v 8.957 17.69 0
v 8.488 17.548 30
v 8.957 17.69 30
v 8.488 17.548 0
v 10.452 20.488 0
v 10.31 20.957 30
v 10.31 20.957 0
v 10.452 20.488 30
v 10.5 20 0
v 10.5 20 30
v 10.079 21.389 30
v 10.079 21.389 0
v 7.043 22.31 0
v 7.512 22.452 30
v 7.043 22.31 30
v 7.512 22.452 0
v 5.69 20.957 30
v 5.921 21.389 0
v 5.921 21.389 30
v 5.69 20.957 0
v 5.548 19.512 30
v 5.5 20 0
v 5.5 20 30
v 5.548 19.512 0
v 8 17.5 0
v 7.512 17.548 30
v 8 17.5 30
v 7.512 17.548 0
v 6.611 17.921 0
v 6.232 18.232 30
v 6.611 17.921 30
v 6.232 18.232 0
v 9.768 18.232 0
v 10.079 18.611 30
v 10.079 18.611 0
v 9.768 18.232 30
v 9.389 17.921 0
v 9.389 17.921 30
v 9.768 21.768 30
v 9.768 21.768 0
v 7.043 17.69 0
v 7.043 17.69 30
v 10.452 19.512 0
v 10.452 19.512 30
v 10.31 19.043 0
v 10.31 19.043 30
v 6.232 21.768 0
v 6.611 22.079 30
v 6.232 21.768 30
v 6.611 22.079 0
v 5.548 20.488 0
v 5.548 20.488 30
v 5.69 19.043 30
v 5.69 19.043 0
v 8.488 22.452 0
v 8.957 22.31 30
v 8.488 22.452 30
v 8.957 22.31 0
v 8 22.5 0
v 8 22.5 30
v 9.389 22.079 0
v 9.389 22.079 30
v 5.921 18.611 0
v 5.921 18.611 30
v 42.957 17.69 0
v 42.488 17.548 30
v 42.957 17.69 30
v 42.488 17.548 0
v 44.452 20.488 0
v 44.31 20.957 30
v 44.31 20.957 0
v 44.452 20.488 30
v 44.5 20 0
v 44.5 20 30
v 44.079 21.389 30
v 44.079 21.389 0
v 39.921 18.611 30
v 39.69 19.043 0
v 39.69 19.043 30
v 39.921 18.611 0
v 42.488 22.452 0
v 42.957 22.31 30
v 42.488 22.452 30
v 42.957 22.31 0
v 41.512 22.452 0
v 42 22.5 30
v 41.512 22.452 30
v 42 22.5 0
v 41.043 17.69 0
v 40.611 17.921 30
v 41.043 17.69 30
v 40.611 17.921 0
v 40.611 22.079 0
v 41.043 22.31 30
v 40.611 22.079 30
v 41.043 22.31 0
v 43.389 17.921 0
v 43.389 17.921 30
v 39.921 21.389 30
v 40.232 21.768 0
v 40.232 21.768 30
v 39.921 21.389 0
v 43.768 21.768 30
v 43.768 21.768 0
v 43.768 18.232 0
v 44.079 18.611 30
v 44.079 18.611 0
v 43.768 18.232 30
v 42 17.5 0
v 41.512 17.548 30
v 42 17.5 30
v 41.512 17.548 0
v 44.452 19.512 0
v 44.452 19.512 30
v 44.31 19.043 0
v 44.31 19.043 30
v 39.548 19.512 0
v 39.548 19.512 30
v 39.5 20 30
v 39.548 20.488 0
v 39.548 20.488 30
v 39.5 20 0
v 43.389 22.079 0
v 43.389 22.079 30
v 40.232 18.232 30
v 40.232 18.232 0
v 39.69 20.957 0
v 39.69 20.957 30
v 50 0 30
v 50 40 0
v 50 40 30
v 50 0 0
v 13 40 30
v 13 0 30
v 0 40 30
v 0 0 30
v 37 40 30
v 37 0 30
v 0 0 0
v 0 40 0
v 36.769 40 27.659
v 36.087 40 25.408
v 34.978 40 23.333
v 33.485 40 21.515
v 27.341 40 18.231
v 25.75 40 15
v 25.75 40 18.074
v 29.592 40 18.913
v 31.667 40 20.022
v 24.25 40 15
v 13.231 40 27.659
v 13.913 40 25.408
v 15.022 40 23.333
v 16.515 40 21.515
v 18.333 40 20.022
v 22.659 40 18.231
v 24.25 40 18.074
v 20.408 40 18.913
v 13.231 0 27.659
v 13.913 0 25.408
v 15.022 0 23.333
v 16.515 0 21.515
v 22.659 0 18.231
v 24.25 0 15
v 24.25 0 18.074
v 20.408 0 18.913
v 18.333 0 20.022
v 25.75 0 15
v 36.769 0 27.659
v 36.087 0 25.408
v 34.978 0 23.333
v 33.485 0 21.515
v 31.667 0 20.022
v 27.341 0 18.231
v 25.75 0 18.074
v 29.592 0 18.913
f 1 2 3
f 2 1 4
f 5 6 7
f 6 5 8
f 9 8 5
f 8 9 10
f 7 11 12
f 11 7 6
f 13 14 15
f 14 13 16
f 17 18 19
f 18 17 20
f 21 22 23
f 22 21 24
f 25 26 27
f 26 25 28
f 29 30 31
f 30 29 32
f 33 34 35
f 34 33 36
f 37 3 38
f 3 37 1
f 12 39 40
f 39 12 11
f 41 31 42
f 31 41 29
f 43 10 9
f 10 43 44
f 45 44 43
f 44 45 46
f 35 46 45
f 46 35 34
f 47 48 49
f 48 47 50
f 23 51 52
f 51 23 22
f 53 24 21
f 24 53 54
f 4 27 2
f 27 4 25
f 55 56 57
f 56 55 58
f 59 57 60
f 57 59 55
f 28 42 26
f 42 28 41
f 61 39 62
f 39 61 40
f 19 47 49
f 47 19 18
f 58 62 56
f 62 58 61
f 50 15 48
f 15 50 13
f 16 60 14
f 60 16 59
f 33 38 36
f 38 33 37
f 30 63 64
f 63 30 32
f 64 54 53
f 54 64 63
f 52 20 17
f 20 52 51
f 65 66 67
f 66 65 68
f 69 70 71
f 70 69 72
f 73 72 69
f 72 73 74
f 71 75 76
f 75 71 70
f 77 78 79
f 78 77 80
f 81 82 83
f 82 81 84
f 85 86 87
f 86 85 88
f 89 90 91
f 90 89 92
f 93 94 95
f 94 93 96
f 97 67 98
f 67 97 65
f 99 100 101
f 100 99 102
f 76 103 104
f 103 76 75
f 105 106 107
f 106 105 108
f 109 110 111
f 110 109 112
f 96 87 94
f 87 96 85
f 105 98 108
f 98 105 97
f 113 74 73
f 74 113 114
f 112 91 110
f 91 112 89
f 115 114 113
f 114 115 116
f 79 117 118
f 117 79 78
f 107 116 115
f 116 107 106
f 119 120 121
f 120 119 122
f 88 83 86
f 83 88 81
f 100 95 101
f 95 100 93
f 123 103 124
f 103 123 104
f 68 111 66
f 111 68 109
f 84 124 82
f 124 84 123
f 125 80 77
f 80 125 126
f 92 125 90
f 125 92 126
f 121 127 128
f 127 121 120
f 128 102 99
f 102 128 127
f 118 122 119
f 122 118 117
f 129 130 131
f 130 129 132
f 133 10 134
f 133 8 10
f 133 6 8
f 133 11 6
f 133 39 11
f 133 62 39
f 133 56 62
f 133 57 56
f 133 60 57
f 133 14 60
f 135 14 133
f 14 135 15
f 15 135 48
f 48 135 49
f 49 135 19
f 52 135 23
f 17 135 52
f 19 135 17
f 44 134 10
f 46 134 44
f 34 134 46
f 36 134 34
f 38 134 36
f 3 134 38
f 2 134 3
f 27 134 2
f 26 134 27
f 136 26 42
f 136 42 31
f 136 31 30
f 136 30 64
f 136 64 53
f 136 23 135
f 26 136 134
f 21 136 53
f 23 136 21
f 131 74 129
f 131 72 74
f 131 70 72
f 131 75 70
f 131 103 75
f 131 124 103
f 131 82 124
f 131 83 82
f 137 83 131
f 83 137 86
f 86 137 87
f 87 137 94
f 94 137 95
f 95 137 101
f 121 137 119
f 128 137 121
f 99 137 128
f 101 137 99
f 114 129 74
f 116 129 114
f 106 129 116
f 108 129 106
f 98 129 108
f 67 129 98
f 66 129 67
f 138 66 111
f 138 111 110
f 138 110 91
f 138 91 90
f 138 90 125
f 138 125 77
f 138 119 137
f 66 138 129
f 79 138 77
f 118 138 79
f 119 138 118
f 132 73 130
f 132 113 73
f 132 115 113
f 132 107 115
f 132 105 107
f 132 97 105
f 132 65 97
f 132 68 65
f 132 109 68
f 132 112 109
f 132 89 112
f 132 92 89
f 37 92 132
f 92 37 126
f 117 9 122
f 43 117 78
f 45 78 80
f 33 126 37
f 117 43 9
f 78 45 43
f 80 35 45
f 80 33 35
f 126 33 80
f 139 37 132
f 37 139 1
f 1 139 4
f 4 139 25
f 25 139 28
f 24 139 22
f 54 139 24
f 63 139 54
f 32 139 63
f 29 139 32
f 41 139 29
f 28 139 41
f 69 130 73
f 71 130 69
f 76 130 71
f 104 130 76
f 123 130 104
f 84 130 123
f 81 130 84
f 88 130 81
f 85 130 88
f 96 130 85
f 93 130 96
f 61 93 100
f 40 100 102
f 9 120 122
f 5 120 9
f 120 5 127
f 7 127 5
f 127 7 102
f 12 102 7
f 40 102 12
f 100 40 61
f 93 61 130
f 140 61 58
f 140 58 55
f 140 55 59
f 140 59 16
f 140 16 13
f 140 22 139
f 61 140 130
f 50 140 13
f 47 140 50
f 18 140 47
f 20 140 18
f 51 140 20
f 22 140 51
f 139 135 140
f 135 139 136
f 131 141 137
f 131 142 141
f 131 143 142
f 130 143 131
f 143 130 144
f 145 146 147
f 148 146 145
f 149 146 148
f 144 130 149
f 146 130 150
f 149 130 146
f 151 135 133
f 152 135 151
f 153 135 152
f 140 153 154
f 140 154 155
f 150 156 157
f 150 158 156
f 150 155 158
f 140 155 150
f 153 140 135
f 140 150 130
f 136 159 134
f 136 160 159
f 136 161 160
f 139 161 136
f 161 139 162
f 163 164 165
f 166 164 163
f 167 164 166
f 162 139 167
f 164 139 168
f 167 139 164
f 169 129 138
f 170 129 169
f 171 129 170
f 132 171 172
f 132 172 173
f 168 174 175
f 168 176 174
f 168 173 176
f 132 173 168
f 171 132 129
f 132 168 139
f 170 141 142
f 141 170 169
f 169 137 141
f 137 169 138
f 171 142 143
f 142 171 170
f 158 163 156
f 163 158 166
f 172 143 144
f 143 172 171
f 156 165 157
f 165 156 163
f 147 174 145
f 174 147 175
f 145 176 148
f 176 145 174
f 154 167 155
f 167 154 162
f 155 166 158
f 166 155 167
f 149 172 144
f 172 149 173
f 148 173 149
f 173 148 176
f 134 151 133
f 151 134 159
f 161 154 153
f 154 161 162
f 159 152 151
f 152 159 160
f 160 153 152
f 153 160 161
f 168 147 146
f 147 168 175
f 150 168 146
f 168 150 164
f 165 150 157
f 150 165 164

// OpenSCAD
$fn = 32;

// ----------------------------------------------------------------------
// Saddle clamp: split shaft clamp
// ----------------------------------------------------------------------

// --- parameters (mm) ---
blk_l = 50;               // block length, X
blk_w = 40;               // block width, Y
blk_h = 30;               // block height
clamp_r = 12;             // shaft groove radius
hole_r = 2.5;             // bolt hole radius
hole_m = 8;               // bolt hole margin from the ends
saw_w = 1.5;              // saw kerf width

saw_depth = clamp_r + 3;  // saw kerf depth

difference() {
  cube([blk_l, blk_w, blk_h]);
  translate([blk_l / 2, -1, blk_h])
    rotate([-90, 0, 0])
      cylinder(h = blk_w + 2, r = clamp_r);
  for (sx = [0, 1])
    translate([sx ? blk_l - hole_m : hole_m, blk_w / 2, -1])
      cylinder(r = hole_r, h = blk_h + 2);
  translate([blk_l / 2 - saw_w / 2, -1, blk_h - saw_depth])
    cube([saw_w, blk_w + 2, saw_depth + 1]);
}
